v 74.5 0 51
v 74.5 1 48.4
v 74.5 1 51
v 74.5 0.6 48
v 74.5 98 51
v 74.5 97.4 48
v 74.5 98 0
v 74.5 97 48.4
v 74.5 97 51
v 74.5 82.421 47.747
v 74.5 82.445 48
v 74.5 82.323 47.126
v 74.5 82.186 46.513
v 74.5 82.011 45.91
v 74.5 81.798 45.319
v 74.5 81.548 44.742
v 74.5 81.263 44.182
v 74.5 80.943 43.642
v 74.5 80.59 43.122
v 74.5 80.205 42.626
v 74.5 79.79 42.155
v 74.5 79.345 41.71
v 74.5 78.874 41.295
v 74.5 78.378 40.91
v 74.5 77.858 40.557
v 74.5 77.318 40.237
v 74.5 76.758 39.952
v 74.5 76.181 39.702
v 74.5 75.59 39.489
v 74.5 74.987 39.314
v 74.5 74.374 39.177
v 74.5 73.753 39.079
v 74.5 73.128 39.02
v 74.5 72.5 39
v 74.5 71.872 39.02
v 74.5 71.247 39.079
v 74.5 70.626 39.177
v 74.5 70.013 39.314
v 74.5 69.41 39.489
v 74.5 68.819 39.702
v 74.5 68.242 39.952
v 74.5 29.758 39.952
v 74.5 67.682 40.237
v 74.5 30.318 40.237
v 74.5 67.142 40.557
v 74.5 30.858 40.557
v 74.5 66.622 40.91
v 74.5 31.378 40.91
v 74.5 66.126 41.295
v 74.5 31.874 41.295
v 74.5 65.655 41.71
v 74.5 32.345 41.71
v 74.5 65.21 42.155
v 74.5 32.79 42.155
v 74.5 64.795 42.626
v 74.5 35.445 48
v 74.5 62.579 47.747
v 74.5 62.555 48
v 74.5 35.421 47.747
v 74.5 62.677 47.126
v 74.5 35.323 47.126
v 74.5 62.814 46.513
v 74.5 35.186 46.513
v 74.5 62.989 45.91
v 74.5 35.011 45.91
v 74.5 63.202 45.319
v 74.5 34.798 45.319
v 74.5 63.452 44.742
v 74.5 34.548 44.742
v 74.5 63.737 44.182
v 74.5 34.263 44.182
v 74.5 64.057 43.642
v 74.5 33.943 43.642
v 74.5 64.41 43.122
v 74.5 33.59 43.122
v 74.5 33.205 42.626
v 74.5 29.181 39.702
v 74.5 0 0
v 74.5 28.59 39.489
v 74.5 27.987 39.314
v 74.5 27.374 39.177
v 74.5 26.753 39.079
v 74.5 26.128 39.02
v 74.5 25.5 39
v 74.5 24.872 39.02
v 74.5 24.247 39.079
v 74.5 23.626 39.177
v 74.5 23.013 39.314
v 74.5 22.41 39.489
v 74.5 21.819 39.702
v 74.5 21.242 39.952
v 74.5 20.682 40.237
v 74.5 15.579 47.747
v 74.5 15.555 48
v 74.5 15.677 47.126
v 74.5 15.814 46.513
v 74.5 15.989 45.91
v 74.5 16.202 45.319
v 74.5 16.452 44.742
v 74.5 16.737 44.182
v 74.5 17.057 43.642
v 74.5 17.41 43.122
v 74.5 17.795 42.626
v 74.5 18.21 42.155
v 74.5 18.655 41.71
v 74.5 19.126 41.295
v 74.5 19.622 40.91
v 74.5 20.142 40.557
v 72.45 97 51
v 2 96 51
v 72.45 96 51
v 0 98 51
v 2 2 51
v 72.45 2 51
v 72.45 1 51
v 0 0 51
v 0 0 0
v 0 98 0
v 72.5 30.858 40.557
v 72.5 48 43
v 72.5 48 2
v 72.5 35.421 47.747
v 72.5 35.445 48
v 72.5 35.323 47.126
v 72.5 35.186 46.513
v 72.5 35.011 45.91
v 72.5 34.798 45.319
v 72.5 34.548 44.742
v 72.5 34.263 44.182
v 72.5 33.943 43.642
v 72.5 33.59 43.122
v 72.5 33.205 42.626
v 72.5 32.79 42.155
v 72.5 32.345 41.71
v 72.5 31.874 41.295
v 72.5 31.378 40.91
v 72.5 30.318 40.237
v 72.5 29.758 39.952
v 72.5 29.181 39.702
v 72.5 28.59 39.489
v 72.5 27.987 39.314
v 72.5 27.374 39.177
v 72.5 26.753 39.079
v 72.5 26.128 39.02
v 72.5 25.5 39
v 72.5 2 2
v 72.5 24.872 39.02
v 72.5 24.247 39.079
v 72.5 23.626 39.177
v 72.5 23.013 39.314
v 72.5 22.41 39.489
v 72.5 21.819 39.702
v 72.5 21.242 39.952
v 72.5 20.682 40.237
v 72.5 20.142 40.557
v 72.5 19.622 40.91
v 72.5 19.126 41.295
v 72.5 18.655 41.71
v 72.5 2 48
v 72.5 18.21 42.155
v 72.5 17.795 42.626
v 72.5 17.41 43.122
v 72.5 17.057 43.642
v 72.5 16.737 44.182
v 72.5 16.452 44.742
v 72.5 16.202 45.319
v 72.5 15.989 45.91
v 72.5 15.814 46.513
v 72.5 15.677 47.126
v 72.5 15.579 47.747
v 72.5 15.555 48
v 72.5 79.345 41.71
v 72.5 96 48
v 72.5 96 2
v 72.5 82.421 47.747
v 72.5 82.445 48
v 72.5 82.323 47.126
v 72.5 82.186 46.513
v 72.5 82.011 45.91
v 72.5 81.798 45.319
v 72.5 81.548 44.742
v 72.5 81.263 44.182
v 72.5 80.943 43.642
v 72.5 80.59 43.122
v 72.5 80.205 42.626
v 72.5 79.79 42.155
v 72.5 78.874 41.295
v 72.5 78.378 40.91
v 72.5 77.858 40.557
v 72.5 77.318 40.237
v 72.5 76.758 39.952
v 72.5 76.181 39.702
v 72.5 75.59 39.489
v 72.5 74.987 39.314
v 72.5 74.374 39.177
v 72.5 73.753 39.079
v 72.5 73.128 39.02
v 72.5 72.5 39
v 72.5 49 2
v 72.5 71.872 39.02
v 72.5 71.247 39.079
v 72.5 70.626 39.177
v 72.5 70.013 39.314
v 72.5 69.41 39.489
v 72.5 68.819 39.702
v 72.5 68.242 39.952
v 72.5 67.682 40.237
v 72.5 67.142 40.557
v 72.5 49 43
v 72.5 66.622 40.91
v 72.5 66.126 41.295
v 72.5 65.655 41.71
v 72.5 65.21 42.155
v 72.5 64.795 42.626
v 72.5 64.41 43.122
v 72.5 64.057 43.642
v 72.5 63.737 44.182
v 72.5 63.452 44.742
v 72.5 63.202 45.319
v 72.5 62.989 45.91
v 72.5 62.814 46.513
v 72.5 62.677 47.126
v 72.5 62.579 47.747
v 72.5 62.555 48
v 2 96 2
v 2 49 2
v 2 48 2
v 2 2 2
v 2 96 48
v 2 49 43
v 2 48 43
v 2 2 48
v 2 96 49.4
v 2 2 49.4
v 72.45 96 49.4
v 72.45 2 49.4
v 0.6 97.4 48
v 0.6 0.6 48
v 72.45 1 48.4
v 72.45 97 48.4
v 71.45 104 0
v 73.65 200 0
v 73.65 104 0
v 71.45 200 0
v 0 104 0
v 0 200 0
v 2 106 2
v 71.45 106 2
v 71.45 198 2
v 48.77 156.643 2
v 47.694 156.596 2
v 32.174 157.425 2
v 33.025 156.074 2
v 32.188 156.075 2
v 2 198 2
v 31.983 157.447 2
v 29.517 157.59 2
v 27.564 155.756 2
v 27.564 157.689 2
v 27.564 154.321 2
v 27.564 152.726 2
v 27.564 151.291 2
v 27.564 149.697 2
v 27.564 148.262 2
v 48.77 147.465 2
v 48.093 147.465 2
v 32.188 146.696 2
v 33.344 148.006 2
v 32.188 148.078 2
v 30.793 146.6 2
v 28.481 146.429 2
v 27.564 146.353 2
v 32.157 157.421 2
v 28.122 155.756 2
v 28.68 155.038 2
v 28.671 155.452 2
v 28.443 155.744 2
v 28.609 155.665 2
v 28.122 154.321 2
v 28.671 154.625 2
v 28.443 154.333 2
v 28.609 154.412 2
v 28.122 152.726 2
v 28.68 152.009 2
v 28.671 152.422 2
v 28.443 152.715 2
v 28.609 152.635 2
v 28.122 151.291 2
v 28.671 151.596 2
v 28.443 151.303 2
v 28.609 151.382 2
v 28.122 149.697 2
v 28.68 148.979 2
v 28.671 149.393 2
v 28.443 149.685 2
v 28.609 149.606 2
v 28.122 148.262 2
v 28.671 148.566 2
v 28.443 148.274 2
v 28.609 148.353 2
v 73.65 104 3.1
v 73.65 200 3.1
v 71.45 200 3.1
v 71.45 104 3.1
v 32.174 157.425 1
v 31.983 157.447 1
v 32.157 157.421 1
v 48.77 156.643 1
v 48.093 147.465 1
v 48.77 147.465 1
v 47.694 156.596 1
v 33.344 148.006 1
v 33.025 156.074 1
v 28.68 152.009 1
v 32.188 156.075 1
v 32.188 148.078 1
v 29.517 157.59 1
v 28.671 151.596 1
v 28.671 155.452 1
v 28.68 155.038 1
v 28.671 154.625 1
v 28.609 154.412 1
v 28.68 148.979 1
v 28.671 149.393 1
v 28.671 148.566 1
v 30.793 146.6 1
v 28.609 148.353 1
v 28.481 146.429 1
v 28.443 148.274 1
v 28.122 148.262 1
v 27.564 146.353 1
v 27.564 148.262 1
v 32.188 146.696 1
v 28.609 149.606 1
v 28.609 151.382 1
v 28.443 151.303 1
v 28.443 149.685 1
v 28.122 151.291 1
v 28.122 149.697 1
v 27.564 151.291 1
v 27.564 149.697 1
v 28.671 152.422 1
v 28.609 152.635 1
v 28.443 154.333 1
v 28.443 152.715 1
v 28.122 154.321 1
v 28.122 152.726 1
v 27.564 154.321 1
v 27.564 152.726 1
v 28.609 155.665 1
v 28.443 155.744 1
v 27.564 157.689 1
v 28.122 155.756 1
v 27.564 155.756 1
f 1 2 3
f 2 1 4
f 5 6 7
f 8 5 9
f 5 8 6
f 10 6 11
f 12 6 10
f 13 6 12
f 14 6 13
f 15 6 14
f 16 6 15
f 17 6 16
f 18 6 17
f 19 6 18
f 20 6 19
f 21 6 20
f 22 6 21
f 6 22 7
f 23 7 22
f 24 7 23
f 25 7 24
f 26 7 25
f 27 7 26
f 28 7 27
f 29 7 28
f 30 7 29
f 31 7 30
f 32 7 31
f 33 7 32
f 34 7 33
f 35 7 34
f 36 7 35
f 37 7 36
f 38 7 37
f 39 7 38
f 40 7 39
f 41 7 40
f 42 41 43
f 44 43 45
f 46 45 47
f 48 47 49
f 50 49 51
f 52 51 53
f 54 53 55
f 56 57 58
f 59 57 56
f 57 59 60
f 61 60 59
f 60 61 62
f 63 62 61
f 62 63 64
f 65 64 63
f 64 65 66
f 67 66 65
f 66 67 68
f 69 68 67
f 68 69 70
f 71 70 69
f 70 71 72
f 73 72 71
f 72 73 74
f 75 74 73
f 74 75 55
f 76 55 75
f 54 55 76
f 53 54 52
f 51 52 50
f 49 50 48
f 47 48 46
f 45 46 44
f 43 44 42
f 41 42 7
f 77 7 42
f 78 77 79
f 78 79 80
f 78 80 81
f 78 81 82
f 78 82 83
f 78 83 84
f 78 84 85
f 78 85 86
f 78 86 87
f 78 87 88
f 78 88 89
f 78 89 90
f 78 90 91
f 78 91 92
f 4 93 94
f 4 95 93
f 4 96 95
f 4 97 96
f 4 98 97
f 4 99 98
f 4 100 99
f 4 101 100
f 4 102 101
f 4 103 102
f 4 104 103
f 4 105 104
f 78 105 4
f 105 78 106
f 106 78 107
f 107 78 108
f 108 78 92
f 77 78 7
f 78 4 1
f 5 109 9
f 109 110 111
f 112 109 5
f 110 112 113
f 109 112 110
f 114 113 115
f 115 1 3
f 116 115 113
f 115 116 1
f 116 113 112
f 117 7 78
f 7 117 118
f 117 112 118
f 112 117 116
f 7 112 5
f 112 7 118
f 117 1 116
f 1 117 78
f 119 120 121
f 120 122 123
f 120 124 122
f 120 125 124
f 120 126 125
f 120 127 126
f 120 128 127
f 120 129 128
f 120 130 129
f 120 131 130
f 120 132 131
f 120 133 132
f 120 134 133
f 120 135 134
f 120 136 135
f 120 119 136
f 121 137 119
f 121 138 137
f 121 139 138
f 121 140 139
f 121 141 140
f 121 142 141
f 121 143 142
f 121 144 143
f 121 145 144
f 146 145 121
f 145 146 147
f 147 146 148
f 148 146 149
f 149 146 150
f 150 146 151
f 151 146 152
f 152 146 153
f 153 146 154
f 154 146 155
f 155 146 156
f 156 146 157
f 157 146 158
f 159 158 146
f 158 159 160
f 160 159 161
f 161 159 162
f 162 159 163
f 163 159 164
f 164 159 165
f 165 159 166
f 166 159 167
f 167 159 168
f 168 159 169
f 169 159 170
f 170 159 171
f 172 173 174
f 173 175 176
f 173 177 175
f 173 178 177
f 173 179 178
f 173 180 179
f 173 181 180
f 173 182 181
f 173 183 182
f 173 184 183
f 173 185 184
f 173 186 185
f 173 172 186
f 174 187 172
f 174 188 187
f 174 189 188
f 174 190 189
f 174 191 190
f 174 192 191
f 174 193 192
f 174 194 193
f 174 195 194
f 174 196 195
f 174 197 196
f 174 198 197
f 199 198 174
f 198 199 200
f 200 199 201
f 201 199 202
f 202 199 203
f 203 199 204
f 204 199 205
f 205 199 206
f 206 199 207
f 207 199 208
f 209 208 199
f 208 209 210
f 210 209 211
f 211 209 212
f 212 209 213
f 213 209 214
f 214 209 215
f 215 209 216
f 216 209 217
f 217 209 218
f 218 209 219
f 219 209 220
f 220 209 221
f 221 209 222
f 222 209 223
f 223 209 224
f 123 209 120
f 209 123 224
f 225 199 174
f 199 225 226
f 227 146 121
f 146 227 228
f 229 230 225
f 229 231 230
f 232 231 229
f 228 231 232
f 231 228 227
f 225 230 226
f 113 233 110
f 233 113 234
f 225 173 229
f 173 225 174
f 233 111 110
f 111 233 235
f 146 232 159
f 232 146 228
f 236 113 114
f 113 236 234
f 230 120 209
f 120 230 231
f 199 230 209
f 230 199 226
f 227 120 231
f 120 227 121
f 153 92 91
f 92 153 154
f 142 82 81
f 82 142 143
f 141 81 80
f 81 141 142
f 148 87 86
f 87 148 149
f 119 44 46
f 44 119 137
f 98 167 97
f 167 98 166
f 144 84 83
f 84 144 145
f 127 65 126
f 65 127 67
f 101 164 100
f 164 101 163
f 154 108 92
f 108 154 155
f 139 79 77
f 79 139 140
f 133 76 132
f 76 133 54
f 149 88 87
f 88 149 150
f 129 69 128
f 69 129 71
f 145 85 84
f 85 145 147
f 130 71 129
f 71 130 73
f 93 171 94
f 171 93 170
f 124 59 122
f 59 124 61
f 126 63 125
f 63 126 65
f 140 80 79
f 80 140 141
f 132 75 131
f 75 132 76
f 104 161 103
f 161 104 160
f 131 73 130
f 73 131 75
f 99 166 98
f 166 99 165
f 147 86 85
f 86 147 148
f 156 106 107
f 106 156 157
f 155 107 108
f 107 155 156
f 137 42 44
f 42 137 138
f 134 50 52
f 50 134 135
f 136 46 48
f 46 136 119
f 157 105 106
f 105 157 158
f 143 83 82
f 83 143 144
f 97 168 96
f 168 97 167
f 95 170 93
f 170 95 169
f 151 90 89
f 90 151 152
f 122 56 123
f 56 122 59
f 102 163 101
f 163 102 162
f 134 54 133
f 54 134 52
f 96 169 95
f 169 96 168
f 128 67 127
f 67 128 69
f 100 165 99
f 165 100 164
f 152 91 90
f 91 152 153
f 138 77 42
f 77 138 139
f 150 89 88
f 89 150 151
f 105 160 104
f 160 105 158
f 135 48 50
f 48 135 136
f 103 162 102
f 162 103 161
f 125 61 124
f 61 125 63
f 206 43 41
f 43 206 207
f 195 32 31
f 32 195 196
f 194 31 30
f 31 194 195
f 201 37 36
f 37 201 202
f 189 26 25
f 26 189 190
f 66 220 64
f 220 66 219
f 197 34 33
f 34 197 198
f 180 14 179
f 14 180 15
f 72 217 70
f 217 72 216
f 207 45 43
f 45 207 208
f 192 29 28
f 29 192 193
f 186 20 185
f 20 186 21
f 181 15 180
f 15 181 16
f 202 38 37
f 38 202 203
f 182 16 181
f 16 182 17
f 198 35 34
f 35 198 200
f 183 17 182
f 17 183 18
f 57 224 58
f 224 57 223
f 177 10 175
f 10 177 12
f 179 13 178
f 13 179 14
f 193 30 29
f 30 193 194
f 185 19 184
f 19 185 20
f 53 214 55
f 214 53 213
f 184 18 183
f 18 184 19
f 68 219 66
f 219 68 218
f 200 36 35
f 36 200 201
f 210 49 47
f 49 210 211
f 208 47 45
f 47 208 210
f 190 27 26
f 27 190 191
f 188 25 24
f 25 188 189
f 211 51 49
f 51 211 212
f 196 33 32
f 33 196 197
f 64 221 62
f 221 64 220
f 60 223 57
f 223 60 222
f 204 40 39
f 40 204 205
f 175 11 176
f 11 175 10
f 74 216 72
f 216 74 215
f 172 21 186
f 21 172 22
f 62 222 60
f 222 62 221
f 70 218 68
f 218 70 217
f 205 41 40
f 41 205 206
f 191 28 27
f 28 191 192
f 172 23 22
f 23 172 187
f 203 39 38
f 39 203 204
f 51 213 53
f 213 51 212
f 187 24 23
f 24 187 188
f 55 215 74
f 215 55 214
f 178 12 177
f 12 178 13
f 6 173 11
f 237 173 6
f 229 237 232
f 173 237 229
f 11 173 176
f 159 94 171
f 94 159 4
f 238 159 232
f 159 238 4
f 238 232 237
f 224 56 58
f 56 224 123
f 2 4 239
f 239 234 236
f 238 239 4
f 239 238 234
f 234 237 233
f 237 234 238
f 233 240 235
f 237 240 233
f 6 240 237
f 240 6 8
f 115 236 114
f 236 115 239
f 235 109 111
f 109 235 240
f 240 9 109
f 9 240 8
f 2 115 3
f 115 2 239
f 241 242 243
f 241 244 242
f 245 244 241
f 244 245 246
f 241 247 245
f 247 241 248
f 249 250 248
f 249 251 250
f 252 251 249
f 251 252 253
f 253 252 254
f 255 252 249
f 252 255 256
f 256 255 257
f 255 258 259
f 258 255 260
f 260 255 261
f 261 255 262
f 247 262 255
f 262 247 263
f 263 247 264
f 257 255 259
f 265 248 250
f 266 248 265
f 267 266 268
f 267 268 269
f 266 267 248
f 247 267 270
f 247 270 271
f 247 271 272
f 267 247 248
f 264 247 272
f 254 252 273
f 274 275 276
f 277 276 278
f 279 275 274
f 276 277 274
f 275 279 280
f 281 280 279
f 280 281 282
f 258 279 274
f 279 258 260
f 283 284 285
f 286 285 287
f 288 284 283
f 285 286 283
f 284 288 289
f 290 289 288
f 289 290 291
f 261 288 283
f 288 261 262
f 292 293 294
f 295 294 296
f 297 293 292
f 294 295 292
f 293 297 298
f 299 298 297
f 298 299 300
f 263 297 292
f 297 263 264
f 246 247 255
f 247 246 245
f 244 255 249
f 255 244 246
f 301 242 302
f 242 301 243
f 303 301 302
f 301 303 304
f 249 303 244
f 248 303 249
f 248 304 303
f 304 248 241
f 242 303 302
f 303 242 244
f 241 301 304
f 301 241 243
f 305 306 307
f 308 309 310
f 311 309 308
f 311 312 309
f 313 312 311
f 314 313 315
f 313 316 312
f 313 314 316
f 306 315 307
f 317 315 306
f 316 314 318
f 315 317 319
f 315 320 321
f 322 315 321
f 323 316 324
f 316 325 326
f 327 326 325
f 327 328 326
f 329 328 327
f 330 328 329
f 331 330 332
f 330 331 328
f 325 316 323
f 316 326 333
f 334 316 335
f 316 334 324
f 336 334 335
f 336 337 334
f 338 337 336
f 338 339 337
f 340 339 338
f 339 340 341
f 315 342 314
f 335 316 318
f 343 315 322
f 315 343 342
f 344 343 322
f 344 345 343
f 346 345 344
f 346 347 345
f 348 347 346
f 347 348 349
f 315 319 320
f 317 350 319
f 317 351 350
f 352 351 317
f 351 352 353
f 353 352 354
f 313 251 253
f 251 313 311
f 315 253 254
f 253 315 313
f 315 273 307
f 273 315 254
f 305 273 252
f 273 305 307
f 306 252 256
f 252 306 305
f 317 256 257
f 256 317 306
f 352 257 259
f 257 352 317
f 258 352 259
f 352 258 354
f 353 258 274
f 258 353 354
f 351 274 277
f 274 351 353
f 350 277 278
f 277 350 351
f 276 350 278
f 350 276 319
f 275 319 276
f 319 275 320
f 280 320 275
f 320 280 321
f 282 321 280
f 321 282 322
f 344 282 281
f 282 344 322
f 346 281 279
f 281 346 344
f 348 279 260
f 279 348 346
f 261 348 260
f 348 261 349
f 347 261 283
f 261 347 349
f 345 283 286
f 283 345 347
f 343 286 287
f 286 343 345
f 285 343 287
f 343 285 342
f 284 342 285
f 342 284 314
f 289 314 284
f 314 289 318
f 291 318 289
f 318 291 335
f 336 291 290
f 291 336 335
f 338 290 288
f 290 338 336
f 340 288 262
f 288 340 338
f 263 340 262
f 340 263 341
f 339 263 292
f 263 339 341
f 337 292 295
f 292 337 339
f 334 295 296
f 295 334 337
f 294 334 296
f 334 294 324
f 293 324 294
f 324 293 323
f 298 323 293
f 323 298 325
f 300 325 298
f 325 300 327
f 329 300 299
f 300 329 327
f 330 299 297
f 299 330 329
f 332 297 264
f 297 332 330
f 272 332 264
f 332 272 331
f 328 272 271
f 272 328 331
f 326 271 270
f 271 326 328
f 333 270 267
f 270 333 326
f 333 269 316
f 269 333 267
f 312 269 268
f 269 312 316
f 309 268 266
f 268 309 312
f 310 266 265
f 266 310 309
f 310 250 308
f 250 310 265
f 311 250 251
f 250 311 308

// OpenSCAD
// file: carcassonne_box.scad
/**
 * @file carcassonne_box.scad
 * @author Conlan Wesson
 * Template for Carcossonne boxes.
 * @copyright Creative Commons Attribution-NonCommercial-ShareAlike 4.0
 */

mm = 1;
cm = 10*mm;

width = 47*mm;
thick = 2.5*mm;
wall = 2*mm;

/**
 * Lid for box.
 * @param count Number of cards.
 * @param columns Number of columns.
 * @param icon Path to icon DXF file.
 * @param rot Icon rotation in degrees.
 * @param mult Icon scale.
 * @param xoff X-offset of icon from center.
 * @param yoff Y-offset of icon from center.
 */
module carcassonne_lid(count, columns=1, icon=false, rot=0, mult=1, xoff=0, yoff=0, g=0){
	length = (thick * count) + ((width/2) - ((thick * count) % (width/2)));
	w = length+(1.5*wall)+.1;
	l = (width*columns)+wall;
	h = wall;
	d = 2;

	CubePoints = [
		[ 0-g, 0-g,   0 ],  //0
		[ w+g, 0-g,   0 ],  //1
		[ w+g, l+g,   0 ],  //2
		[ 0-g, l+g,   0 ],  //3
		[   d,   d, h+g ],  //4
		[   w,   d, h+g ],  //5
		[   w, l-d, h+g ],  //6
		[   d, l-d, h+g ]   //7
	];
	
	CubeFaces = [
		[0,1,2,3],  // bottom
		[4,5,1,0],  // front
		[7,6,5,4],  // top
		[5,6,2,1],  // right
		[6,7,3,2],  // back
		[7,4,0,3]   // left
	];
	
	
	difference(){
		union(){
			polyhedron( CubePoints, CubeFaces );
			translate([w-wall-.15,0,0]) cube([wall+.2,l, (1.5*wall)+.1]);
		}
		if(icon){
			translate([w/2+xoff,l/3+yoff,h-(wall/2)]){
				linear_extrude(height=(wall)+.1){
					rotate(rot) scale(mult) import(icon);
				}
			}
		}
	}
}

/**
 * Carcassonne card box.
 * @param count Number of cards.
 * @param dividers Array of divider positions.
 * @param columns Number of columns.
 */
module carcassonne_box(count, dividers=[], columns=1){
	length = (thick * count) + ((width/2) - ((thick * count) % (width/2)));
	difference(){
		union(){
			difference(){
				// Outer walls
				cube([length+(2*wall), (width*columns)+(2*wall), width+(2*wall)]);
				// Cavity
				translate([wall, wall, wall]){
					cube([length, width*columns, (width+wall)+.1]);
				}
			}
			// Dividers
			for(col = [0:columns-1]){
				for(div = dividers[col]){
					translate([(div*(width/2))+(wall/2), width*col+wall, 0]) cube([wall/2, width, width-(2*wall)]);
				}
				if(col > 0){
					translate([0, width*col+(wall/2), 0]) cube([length+(2*wall), wall/2, width-(2*wall)]);
				}
			}
		}
		union(){
			// Notch
			for(col = [0:columns-1]){
				translate([wall, wall+(width*col), wall]){
					translate([0, width/2, width])
					rotate([0, 90, 0]){
						cylinder(r=10, h=length+(2*wall), $fn=100);
					}
				}
			}
			// Track
			translate([wall/2,wall/2,width+wall/2]) carcassonne_lid(count, columns, g=0.4);
		}
	}
}
// main file
/**
 * @file tower.scad
 * @author Conlan Wesson
 * The Tower Carcossonne box.
 * @copyright Creative Commons Attribution-NonCommercial-ShareAlike 4.0
 */

include <carcassonne_box.scad>

count = 24;
dividers = [[]];
columns = 2;

carcassonne_box(count, dividers, columns);
translate([0,width*columns+10,0]) carcassonne_lid(count, columns, icon="tower.dxf", rot=90, mult=0.075, xoff=15, yoff=7);
